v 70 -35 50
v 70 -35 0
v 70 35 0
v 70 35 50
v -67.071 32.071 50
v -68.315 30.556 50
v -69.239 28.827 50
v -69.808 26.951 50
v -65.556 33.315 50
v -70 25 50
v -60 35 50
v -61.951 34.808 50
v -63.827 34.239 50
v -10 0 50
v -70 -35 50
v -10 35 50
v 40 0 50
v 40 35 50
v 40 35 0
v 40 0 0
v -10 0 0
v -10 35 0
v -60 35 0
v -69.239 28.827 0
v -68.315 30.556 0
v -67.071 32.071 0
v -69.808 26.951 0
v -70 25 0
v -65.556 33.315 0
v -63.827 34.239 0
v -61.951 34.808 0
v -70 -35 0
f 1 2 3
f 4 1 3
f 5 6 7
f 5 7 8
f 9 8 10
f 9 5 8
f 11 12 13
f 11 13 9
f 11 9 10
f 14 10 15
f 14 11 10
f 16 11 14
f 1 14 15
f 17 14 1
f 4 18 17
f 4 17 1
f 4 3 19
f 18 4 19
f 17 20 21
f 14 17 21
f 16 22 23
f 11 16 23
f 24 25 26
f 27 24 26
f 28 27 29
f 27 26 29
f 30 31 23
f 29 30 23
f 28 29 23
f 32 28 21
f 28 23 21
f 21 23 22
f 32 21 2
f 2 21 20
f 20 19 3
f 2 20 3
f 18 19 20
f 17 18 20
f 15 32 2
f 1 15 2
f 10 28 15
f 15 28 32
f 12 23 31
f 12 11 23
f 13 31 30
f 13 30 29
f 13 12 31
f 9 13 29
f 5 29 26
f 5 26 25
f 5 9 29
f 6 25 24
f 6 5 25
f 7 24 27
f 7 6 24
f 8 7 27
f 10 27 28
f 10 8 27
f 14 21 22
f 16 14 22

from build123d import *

# Parameters (mm, degrees)
RESSALTO_EXTRUS_O1_DEPTH = 50
FILETE1_R                = 10


with BuildPart() as part:
    # Esboço1 → Ressalto-extrusão1 (new body)
    with BuildSketch(Plane.XY):
        Polygon((-10, 35), (-70, 35), (-70, -35), (70, -35), (70, 35), (40, 35), (40, 0), (-10, 0), align=None)
    extrude(amount=RESSALTO_EXTRUS_O1_DEPTH)

    # Filete1
    filete1_edges = [part.edges().sort_by_distance(p)[0] for p in [
        (-70, 35, 25),
    ]]
    fillet(filete1_edges, radius=FILETE1_R)


solid = part.part
